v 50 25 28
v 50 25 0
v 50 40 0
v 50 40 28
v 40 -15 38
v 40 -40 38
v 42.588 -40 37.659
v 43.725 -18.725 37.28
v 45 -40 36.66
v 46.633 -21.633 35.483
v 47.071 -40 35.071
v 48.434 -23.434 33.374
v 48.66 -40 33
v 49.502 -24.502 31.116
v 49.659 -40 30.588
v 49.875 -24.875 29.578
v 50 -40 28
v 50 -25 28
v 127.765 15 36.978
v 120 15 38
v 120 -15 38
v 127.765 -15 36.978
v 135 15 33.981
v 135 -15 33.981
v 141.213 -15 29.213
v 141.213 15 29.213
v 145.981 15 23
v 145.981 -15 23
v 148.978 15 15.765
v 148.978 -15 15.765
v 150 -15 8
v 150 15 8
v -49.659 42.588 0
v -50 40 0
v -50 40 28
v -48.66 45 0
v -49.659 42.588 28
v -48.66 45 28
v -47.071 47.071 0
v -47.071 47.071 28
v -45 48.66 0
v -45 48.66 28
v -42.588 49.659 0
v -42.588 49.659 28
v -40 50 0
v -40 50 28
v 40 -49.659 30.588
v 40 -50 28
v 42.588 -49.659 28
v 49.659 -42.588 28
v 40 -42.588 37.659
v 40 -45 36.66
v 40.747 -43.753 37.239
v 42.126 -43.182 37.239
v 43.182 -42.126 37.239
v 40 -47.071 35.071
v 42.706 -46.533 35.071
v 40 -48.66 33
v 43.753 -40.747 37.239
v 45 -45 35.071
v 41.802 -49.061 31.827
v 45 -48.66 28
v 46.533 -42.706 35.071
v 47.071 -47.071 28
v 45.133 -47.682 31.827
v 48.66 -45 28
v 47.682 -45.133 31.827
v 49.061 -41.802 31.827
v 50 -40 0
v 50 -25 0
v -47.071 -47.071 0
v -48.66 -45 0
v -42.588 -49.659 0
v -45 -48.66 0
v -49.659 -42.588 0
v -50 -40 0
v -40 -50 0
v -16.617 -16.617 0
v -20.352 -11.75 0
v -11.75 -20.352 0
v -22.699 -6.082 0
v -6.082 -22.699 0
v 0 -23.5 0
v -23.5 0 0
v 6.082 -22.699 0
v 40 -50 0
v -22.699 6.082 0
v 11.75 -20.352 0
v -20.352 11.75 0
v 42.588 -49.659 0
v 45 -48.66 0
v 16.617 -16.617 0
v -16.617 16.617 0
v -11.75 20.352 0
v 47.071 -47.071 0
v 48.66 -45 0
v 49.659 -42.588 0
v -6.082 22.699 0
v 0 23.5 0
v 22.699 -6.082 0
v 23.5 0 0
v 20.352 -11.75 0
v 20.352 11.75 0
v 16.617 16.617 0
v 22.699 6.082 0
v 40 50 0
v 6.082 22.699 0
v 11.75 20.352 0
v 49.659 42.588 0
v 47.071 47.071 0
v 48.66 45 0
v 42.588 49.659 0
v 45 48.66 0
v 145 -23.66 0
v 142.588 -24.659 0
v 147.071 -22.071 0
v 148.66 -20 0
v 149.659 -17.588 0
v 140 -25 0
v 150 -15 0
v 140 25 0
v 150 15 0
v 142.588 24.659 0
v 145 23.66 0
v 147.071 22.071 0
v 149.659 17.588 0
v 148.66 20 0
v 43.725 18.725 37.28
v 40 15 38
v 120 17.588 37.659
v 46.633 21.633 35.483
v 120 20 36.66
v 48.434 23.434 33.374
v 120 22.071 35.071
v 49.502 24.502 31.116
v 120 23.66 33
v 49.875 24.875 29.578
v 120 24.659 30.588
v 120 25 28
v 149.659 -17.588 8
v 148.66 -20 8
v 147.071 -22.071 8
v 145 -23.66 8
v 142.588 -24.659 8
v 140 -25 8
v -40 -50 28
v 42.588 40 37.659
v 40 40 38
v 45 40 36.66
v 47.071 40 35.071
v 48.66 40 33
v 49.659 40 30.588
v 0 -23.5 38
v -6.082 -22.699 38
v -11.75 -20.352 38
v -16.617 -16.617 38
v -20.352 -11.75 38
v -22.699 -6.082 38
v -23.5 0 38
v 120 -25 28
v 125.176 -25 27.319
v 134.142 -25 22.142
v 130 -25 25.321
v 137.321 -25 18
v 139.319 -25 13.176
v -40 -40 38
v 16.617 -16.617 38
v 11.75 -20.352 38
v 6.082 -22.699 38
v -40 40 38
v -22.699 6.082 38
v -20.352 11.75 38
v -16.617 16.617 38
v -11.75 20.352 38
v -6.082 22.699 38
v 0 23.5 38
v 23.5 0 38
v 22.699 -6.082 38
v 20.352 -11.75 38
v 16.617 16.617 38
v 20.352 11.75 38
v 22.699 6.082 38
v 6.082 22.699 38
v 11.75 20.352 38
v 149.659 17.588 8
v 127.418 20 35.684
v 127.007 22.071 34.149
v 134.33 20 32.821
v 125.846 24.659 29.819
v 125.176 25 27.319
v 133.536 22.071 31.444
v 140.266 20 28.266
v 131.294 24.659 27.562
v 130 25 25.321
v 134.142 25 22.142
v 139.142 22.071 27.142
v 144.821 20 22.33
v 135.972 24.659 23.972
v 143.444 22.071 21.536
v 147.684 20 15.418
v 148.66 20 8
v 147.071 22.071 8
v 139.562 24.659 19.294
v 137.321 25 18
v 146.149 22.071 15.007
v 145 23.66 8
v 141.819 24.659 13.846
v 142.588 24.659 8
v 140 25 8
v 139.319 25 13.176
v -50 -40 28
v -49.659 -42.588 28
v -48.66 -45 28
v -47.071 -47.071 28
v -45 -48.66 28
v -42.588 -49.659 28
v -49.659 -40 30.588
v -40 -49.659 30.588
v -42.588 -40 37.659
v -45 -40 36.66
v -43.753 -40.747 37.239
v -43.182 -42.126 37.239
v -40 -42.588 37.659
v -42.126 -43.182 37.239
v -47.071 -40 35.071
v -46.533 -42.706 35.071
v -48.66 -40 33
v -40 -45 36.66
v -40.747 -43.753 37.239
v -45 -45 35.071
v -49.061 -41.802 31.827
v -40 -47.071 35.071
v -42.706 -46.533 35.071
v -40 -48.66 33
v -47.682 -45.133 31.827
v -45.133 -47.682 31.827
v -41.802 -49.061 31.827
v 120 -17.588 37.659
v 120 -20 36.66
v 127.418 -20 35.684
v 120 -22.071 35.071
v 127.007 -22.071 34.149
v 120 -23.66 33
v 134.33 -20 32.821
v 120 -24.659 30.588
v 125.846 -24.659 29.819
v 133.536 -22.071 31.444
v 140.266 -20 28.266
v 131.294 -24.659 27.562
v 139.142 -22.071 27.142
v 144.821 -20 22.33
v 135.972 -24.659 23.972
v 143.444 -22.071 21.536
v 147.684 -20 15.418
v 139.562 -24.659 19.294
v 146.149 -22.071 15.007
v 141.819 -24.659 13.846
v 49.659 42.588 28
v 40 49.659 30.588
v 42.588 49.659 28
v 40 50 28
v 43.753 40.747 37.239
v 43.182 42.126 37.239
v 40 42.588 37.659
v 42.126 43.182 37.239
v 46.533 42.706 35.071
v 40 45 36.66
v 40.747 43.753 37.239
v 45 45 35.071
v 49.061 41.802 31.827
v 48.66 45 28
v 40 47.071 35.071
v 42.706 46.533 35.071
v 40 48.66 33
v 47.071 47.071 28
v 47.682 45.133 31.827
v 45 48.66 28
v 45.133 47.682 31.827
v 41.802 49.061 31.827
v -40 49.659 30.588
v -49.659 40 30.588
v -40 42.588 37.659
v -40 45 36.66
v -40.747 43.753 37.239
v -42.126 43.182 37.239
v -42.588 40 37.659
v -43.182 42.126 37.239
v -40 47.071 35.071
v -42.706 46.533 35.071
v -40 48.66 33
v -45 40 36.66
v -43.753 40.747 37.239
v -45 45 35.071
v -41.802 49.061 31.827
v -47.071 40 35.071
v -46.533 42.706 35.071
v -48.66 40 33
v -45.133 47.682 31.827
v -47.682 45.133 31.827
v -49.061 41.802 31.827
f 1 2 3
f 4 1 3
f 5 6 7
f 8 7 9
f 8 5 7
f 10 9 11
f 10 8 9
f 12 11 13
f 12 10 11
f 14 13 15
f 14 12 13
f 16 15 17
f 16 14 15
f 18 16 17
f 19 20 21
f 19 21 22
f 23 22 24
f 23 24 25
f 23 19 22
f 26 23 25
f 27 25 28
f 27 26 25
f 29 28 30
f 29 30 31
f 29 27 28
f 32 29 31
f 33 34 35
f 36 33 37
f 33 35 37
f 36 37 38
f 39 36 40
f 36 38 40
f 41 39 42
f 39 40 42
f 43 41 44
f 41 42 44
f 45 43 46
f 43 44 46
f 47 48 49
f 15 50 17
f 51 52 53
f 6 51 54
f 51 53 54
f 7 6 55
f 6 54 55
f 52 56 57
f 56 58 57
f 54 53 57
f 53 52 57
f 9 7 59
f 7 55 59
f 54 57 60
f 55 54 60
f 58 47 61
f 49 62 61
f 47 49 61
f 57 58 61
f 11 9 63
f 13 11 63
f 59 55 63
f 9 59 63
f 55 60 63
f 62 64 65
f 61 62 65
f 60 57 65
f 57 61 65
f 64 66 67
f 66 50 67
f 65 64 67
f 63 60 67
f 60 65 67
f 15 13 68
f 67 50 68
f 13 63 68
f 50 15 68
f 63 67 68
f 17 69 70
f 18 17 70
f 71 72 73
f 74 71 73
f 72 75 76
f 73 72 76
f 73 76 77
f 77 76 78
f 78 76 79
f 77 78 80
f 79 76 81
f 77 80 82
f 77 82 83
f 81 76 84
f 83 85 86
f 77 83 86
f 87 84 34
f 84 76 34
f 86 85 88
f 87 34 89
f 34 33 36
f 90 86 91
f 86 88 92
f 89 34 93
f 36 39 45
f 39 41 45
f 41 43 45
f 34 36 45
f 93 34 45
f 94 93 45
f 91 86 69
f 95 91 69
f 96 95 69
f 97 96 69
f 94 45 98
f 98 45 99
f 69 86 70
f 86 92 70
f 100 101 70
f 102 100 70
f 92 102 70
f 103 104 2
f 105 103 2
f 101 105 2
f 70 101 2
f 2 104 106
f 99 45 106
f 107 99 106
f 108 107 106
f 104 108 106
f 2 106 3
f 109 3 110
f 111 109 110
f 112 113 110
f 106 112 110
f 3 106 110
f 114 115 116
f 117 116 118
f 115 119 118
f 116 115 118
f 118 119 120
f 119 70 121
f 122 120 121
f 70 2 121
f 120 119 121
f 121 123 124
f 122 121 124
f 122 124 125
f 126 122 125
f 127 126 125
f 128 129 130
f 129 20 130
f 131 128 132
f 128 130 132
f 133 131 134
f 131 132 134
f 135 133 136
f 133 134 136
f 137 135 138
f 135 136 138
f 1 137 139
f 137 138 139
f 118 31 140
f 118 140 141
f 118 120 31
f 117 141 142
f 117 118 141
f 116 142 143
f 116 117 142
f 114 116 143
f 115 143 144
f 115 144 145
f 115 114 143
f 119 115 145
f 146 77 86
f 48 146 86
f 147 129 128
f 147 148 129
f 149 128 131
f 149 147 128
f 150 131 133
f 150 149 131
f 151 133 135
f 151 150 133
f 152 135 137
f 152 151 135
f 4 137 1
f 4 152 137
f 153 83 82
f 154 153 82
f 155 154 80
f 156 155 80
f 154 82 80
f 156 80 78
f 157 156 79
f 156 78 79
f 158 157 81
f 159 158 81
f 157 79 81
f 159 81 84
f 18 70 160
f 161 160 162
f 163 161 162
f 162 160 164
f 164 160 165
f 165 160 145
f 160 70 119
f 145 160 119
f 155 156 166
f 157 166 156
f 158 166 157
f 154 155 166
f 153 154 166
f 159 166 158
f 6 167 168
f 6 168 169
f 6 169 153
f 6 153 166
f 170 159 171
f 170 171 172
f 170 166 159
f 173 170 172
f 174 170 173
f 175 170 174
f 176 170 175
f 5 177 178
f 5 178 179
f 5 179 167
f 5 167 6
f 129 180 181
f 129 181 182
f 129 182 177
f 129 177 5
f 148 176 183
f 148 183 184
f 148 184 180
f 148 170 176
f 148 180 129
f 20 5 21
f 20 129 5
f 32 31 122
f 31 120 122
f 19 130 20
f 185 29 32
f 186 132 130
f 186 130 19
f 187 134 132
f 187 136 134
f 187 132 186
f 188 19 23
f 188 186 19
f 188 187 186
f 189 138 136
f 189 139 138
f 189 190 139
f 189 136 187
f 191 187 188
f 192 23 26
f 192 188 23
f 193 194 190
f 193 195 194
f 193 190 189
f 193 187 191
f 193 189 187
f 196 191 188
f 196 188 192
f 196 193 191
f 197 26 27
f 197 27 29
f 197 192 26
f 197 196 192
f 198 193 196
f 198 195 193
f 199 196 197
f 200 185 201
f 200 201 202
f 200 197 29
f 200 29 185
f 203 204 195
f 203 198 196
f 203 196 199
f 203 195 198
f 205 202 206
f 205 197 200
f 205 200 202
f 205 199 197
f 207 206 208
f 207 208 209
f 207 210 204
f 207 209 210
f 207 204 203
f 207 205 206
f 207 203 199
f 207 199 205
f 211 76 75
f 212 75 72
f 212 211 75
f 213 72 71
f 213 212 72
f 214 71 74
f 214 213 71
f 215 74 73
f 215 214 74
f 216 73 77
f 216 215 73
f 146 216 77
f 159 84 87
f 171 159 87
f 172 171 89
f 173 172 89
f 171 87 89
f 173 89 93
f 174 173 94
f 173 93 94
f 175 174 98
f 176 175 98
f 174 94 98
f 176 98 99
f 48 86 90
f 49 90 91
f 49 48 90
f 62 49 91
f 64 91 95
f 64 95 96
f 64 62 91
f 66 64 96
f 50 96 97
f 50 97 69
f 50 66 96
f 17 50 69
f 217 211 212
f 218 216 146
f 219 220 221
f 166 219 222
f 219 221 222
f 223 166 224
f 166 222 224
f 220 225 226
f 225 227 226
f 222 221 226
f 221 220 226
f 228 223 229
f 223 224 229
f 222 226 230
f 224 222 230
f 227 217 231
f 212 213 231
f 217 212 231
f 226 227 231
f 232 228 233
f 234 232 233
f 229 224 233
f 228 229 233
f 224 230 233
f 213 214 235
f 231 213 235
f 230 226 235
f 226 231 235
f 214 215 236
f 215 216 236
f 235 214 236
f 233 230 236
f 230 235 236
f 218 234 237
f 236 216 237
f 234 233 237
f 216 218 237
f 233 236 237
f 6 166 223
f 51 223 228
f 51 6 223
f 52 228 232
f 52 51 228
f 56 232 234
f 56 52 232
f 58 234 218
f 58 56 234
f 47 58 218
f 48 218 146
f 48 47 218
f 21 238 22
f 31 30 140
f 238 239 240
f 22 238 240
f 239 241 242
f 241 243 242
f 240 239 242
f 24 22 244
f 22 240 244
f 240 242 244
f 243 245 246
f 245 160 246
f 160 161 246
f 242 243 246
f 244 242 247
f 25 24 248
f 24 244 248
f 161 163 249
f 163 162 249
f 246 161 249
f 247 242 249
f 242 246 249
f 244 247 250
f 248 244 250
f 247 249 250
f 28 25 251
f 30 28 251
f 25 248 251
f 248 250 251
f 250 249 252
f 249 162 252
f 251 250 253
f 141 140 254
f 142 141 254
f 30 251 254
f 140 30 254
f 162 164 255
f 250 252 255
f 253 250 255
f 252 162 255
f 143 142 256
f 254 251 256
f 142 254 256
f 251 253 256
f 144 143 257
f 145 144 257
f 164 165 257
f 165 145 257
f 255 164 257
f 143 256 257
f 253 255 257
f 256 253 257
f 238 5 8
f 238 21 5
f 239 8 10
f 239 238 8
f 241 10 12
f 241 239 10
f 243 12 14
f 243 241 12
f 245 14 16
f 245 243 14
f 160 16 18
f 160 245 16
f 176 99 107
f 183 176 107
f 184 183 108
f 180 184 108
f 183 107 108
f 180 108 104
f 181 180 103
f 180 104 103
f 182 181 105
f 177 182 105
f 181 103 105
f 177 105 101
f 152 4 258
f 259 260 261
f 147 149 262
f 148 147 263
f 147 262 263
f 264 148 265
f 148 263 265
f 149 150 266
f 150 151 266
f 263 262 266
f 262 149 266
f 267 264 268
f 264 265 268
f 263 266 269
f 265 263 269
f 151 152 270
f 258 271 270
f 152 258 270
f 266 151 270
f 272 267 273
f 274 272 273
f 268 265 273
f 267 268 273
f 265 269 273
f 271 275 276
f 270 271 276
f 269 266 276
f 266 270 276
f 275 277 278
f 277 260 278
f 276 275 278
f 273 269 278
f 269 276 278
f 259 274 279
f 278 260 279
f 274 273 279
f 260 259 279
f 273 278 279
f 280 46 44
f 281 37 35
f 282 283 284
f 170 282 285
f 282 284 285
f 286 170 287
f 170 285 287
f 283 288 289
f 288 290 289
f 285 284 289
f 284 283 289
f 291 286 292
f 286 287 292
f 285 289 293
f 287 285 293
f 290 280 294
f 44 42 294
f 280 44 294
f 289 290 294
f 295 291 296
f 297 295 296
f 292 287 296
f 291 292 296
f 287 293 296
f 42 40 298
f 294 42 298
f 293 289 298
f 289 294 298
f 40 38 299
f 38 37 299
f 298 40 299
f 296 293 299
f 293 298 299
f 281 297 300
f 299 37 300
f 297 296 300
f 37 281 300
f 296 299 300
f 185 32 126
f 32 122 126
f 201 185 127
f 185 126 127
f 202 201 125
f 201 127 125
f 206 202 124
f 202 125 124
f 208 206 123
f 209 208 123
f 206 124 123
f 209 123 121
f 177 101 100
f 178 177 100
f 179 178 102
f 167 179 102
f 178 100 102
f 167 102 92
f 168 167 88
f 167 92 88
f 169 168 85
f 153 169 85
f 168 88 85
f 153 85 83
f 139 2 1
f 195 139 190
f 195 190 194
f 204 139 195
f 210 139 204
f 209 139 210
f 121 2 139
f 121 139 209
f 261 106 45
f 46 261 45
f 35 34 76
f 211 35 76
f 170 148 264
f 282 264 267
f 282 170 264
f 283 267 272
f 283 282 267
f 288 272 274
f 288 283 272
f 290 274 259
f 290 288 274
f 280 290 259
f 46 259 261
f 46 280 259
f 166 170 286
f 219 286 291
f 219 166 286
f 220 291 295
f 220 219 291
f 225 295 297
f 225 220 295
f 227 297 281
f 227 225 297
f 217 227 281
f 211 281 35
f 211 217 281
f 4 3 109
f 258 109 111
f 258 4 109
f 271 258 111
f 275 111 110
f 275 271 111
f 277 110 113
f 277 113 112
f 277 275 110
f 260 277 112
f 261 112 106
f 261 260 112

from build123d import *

# Parameters (mm, degrees)
SKETCH_1_W      = 100
SKETCH_1_H      = 25
EXTRUDE_1_DEPTH = 38
FILLET_1_R      = 10
FILLET_2_R      = 30
FILLET_3_R      = 10


with BuildPart() as part:
    # 草图1 → 凸台-拉伸1 (new body)
    with BuildSketch(Plane.XY):
        with BuildLine():
            Line((0, 23.5), (0, 25))
            Line((0, 25), (0, 48.210201589))
            Line((0, 48.210201589), (0, 50))
            Line((0, 50), (-50, 50))
            Line((-50, 50), (-50, 0))
            Line((-50, 0), (-23.5, 0))
            ThreePointArc((-23.5, 0), (-16.617009358, 16.617009358), (0, 23.5))
        make_face()
        with BuildLine():
            Line((50, 0), (23.5, 0))
            ThreePointArc((23.5, 0), (16.617009358, -16.617009358), (0, -23.5))
            Line((0, -23.5), (0, -25))
            Line((0, -25), (50, -25))
            Line((50, -25), (50, 0))
        make_face()
        with BuildLine():
            Line((50, 25), (0, 25))
            Line((0, 25), (0, 23.5))
            ThreePointArc((0, 23.5), (16.617009358, 16.617009358), (23.5, 0))
            Line((23.5, 0), (50, 0))
            Line((50, 0), (50, 25))
        make_face()
        Polygon((0, 48.210201589), (0, 25), (50, 25), (50, 50), (0, 50), align=None)
        with Locations((100, 12.5)):
            Rectangle(SKETCH_1_W, SKETCH_1_H)
        with Locations((100, -12.5)):
            Rectangle(SKETCH_1_W, SKETCH_1_H)
        with BuildLine():
            ThreePointArc((0, -23.5), (-16.617009358, -16.617009358), (-23.5, 0))
            Line((-23.5, 0), (-50, 0))
            Line((-50, 0), (-50, -50))
            Line((-50, -50), (50, -50))
            Line((50, -50), (50, -25))
            Line((50, -25), (0, -25))
            Line((0, -25), (0, -23.5))
        make_face()
    extrude(amount=EXTRUDE_1_DEPTH)

    # 圆角1
    fillet_1_edges = [part.edges().sort_by_distance(p)[0] for p in [
        (50, -50, 19),
        (-50, -50, 19),
        (-50, 50, 19),
        (50, 50, 19),
    ]]
    fillet(fillet_1_edges, radius=FILLET_1_R)

    # 圆角2
    fillet_2_edges = [part.edges().sort_by_distance(p)[0] for p in [
        (150, 0, 38),
    ]]
    fillet(fillet_2_edges, radius=FILLET_2_R)

    # 圆角3
    fillet_3_edges = [part.edges().sort_by_distance(p)[0] for p in [
        (85, 25, 38),
        (50, 32.5, 38),
        (0, 50, 38),
        (-50, 0, 38),
        (0, -50, 38),
        (50, -32.5, 38),
        (-47.071067812, 47.071067812, 38),
        (-47.071067812, -47.071067812, 38),
        (85, -25, 38),
        (47.071067812, -47.071067812, 38),
        (47.071067812, 47.071067812, 38),
        (150, 25, 4),
        (141.213203436, 25, 29.213203436),
        (150, -25, 4),
        (141.213203436, -25, 29.213203436),
    ]]
    fillet(fillet_3_edges, radius=FILLET_3_R)


solid = part.part
